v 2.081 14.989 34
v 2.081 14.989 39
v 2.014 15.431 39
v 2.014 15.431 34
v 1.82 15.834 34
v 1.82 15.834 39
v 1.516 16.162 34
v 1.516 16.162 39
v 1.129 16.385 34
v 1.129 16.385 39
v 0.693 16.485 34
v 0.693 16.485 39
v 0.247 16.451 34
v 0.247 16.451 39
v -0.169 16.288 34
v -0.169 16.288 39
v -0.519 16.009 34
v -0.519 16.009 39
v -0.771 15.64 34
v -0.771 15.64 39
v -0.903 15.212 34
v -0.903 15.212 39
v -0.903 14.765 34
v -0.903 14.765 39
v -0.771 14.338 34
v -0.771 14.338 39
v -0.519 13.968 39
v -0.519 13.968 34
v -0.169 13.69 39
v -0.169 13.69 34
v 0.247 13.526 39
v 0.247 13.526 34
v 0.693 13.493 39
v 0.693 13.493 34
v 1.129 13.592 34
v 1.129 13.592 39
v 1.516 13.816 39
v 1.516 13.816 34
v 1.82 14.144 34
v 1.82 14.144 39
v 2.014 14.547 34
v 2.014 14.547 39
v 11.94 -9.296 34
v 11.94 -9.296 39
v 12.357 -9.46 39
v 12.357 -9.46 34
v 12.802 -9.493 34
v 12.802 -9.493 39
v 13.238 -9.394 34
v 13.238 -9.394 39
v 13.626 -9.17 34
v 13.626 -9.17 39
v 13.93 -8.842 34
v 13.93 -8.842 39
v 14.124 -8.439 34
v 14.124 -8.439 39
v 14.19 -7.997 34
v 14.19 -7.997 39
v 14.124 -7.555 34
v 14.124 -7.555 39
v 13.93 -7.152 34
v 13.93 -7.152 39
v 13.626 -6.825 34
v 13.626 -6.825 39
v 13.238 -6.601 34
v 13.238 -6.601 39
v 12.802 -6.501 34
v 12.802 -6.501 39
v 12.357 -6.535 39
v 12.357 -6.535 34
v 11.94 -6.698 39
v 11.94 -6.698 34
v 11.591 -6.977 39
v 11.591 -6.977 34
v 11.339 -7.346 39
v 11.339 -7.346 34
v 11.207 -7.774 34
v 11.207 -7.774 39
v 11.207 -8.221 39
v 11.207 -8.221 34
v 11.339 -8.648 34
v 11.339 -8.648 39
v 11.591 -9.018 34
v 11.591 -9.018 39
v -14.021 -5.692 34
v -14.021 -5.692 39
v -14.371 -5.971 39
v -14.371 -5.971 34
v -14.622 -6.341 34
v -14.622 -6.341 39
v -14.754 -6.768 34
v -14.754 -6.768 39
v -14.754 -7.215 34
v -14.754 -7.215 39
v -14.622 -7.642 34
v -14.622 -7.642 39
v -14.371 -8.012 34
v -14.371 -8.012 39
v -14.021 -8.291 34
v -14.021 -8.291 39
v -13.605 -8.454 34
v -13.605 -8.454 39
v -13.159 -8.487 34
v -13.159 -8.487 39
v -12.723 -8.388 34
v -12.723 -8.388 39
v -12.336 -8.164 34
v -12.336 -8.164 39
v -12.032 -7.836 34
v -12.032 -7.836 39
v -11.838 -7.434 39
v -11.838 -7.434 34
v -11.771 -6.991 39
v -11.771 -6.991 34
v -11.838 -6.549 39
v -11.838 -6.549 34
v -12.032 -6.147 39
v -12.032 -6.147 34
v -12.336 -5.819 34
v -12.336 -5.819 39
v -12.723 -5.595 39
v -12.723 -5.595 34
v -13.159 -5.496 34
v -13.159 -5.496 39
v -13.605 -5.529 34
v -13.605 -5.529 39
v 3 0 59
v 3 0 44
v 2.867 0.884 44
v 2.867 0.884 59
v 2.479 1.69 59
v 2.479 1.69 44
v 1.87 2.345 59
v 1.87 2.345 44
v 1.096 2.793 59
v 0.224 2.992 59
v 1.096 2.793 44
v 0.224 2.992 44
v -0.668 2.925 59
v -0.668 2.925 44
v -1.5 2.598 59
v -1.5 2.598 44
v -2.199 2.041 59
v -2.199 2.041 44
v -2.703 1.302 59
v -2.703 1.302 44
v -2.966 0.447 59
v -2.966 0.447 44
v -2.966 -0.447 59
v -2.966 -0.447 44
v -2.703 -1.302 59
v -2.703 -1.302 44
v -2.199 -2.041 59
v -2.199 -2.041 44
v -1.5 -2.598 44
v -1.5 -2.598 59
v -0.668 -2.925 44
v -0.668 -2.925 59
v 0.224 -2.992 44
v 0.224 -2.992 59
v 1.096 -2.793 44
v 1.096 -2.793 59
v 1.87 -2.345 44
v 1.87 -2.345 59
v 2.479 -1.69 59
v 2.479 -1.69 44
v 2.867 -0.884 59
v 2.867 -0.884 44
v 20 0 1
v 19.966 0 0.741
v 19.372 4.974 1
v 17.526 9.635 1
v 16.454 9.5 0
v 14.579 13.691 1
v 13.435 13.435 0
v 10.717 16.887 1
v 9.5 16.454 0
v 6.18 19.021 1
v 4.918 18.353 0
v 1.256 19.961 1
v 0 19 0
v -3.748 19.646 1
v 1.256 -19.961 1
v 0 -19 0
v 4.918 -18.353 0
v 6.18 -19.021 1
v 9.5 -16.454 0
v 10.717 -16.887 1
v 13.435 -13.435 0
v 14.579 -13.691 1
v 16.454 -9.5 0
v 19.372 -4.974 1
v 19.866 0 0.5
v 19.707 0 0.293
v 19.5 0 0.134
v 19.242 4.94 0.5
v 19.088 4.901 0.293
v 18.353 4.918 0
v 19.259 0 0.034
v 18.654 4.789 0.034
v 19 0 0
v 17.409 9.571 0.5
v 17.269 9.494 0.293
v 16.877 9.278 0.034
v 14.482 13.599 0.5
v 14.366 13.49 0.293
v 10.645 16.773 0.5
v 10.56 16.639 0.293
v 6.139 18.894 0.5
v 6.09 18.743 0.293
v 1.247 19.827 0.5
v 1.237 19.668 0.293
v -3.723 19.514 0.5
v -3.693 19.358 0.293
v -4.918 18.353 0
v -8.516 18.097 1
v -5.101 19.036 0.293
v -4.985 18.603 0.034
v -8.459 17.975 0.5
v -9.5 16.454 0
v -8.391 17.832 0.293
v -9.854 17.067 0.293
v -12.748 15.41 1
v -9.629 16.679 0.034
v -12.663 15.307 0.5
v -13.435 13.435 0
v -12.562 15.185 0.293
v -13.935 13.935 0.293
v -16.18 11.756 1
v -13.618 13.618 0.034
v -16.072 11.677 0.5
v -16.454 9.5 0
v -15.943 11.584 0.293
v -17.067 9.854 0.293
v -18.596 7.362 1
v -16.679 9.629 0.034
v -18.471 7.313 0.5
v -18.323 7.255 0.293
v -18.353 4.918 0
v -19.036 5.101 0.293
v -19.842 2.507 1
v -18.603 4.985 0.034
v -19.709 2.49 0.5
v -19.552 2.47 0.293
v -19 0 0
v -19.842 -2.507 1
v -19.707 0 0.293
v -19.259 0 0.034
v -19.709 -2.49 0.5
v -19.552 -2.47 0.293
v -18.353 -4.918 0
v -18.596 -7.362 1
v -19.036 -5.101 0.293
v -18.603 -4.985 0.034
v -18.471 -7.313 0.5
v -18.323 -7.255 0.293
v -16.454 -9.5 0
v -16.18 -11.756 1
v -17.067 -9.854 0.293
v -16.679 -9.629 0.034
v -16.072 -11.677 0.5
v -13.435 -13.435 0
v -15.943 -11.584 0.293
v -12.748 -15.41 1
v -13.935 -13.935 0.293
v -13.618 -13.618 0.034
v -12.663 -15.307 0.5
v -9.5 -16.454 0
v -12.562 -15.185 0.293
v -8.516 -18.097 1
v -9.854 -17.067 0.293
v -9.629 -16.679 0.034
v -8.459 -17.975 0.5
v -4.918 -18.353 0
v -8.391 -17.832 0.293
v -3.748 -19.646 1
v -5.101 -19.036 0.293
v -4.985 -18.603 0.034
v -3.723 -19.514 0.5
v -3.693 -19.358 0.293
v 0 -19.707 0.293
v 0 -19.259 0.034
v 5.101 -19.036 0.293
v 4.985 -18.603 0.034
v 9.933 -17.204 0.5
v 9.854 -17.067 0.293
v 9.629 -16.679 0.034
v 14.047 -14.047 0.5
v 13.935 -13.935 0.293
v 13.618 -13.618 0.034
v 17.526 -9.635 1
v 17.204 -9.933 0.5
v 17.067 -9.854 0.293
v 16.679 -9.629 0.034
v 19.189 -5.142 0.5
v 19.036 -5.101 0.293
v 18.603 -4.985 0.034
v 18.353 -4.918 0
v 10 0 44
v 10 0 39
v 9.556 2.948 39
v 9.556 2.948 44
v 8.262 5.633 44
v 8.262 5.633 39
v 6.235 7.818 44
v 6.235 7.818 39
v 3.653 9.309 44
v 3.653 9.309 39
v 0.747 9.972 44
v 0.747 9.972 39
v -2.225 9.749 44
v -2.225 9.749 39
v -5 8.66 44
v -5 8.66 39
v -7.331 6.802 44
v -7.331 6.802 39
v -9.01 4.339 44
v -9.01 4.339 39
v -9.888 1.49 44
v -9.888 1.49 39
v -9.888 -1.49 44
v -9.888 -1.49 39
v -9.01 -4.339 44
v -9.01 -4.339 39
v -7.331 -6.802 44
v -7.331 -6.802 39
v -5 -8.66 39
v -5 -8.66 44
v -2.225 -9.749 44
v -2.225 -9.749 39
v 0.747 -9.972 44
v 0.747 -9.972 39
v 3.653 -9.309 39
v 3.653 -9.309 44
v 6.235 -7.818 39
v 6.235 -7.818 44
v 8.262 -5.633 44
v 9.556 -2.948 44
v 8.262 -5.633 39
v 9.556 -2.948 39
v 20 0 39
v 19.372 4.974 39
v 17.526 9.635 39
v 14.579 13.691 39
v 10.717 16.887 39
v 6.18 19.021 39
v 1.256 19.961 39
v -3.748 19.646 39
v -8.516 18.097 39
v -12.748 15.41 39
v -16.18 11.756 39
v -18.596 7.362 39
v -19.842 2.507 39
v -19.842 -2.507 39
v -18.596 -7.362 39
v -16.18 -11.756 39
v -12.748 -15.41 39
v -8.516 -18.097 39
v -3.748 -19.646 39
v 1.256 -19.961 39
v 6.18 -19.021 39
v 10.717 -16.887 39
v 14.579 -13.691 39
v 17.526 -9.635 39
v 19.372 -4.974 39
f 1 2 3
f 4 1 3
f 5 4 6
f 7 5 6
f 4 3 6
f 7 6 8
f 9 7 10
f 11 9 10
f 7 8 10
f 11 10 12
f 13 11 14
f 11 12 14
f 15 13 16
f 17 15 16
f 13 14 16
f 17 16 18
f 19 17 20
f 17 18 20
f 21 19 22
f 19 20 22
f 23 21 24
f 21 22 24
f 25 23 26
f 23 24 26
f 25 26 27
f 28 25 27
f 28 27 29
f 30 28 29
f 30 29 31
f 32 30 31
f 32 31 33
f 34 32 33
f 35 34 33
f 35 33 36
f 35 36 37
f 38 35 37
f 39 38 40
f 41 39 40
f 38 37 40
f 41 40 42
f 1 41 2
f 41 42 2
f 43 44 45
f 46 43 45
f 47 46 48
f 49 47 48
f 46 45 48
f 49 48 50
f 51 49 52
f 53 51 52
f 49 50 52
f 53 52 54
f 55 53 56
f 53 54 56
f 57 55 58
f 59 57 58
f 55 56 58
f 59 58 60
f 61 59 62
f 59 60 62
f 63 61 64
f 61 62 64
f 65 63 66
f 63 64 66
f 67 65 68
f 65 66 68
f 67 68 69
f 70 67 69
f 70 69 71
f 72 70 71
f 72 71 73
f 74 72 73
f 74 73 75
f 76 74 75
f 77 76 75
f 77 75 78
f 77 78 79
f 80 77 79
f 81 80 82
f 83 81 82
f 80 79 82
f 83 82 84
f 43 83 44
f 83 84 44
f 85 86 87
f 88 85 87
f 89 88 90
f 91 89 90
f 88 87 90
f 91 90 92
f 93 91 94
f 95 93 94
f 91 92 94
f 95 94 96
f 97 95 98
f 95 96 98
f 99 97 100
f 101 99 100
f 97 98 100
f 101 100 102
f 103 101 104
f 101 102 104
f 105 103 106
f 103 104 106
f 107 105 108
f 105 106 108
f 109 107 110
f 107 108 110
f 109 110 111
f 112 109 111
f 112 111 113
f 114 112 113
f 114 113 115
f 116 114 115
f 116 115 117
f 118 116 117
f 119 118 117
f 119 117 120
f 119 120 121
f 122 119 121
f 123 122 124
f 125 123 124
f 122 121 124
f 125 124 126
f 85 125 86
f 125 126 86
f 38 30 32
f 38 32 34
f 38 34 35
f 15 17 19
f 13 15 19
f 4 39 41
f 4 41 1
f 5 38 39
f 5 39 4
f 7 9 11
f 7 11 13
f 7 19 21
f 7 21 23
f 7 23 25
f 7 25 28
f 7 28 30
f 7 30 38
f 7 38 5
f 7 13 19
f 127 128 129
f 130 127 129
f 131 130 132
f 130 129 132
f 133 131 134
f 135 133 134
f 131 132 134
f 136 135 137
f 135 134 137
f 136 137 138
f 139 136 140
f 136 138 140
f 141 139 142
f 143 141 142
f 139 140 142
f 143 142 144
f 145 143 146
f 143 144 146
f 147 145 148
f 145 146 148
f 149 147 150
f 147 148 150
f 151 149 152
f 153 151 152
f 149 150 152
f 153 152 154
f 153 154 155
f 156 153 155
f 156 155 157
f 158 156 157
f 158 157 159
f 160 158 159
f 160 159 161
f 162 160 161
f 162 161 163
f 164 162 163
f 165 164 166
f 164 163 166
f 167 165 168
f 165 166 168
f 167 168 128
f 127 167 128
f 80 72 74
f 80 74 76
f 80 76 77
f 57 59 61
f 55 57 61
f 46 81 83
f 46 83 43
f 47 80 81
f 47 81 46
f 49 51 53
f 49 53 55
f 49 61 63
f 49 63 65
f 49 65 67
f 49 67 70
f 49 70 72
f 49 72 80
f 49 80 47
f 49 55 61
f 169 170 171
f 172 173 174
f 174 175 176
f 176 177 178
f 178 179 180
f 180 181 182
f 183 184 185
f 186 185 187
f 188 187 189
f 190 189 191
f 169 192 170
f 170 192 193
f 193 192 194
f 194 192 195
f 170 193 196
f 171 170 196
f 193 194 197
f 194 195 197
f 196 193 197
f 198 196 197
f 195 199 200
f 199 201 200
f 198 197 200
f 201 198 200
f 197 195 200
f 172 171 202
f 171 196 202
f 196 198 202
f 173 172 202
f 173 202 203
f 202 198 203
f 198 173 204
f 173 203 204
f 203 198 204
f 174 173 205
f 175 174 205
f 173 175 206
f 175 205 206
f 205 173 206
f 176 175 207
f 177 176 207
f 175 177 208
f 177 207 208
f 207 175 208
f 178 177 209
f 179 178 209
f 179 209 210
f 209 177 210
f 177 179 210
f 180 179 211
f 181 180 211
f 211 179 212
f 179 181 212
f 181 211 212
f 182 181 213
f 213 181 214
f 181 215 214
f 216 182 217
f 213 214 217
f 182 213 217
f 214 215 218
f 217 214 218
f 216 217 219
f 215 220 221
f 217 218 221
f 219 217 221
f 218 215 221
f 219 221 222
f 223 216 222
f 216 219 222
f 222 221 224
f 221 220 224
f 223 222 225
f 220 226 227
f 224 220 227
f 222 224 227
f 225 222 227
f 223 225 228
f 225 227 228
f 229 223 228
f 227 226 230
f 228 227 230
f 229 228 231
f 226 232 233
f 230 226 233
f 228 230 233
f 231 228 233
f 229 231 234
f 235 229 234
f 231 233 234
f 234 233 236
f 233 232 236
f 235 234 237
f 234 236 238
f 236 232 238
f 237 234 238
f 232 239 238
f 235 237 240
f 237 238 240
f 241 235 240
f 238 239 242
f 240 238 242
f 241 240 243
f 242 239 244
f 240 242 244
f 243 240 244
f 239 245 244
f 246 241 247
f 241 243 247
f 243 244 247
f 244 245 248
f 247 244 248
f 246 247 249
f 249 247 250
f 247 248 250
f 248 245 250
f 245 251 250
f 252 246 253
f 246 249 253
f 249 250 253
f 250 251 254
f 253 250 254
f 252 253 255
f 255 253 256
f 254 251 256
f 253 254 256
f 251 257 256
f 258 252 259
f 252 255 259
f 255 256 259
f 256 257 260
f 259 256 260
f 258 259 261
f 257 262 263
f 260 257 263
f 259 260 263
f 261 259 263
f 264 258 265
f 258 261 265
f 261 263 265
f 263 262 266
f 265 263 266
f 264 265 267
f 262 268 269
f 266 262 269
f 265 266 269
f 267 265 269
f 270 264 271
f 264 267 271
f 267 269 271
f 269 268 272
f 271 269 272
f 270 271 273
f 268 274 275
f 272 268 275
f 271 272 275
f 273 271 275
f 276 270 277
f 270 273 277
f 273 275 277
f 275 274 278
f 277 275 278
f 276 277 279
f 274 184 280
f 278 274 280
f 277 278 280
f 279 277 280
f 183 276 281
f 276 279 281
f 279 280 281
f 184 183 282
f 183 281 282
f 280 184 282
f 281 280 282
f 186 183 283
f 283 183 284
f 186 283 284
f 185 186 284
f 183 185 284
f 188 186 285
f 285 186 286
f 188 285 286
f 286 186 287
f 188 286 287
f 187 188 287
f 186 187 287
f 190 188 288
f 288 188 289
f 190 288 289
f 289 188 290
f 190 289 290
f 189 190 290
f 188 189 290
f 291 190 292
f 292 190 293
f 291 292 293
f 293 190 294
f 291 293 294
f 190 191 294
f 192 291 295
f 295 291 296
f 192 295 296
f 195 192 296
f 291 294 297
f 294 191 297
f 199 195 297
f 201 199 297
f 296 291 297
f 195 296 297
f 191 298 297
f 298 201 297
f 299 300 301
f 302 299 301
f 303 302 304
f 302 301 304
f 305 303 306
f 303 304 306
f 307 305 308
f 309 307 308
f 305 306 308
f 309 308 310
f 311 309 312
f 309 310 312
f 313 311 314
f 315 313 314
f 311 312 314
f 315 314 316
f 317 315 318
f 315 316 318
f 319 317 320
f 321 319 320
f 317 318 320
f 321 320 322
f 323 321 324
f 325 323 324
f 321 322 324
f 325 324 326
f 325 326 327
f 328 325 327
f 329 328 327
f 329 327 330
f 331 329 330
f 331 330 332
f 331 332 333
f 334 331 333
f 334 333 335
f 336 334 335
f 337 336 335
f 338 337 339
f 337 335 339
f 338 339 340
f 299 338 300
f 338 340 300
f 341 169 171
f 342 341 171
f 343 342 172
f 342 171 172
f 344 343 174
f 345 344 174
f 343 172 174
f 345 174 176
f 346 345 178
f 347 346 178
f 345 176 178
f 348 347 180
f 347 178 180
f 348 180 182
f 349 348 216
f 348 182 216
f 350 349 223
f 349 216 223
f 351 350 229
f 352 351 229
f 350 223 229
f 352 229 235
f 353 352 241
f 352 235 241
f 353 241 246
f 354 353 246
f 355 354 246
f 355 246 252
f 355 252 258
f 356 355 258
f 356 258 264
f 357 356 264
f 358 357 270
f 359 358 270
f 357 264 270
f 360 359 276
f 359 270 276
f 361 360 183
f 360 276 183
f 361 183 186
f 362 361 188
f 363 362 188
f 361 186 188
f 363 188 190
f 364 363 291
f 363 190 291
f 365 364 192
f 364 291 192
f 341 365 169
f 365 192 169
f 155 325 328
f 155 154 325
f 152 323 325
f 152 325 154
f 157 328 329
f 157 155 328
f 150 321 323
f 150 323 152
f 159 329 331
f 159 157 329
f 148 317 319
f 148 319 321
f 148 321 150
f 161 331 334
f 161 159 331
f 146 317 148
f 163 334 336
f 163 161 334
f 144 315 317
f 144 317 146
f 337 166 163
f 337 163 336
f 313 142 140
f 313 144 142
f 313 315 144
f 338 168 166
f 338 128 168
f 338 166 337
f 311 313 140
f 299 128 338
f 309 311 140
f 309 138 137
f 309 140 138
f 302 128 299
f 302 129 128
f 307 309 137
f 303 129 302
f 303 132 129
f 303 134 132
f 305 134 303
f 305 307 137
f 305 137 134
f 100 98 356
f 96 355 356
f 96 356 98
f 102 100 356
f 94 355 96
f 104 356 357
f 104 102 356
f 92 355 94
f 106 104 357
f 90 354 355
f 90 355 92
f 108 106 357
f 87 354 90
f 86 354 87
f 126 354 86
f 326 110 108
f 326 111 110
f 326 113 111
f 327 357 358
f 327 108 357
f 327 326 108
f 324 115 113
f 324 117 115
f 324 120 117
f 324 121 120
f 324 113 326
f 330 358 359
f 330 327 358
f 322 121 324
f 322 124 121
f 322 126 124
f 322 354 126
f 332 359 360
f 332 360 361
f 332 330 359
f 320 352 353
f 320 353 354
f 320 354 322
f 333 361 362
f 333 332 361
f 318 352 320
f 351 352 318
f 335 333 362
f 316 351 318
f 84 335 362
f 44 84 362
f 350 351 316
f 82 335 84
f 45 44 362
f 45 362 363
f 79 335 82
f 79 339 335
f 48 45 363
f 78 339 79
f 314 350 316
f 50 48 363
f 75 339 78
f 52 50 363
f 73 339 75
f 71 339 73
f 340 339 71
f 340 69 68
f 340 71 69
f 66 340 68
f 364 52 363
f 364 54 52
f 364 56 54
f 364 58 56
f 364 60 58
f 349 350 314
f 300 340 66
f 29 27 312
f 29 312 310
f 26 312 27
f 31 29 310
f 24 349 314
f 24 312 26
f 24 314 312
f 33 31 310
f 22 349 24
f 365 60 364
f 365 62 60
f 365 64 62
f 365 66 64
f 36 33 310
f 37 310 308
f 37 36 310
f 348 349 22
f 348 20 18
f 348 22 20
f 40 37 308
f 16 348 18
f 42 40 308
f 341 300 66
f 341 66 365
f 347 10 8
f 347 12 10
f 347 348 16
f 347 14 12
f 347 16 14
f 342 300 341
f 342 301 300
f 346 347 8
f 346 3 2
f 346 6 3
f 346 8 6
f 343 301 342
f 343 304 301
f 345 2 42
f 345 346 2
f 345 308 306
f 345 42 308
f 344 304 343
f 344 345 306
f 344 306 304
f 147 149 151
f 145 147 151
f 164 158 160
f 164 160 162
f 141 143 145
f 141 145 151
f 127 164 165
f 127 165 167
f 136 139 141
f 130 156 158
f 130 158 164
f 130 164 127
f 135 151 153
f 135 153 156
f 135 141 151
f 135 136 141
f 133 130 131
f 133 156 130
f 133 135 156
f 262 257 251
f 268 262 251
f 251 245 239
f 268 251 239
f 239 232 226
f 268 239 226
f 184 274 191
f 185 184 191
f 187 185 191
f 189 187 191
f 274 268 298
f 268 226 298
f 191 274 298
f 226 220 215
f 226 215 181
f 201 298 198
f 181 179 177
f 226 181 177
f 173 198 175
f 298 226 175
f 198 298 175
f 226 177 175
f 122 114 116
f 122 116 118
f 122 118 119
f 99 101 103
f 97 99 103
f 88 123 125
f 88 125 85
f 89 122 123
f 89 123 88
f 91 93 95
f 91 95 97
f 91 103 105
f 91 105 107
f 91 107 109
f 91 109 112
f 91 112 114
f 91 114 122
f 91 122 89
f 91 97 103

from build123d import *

# Parameters (mm, degrees)
SKETCH1_R           = 20
BOSS_EXTRUDE1_DEPTH = 39
SKETCH2_R           = 10
BOSS_EXTRUDE2_DEPTH = 5
SKETCH3_R           = 3
BOSS_EXTRUDE3_DEPTH = 15
FILLET1_R           = 1
SKETCH4_R           = 1.5
CUT_EXTRUDE1_DEPTH  = 5
CIRPATTERN1_COUNT   = 3


with BuildPart() as part:
    # Sketch1 → Boss-Extrude1 (new body)
    with BuildSketch(Plane.XY):
        Circle(SKETCH1_R)
    extrude(amount=BOSS_EXTRUDE1_DEPTH)

    # Sketch2 → Boss-Extrude2 (add)
    with BuildSketch(Plane.XY.offset(39)):
        Circle(SKETCH2_R)
    extrude(amount=BOSS_EXTRUDE2_DEPTH)

    # Sketch3 → Boss-Extrude3 (add)
    with BuildSketch(Plane.XY.offset(44)):
        Circle(SKETCH3_R)
    extrude(amount=BOSS_EXTRUDE3_DEPTH)

    # Fillet1
    fillet1_edges = [part.edges().sort_by_distance(p)[0] for p in [
        (-20, 0, 0),
    ]]
    fillet(fillet1_edges, radius=FILLET1_R)

    # Sketch4 → Cut-Extrude1 (cut)
    with BuildSketch(Plane.XY.offset(39)):
        with Locations((0.580678207, 14.988756213)):
            Circle(SKETCH4_R)
    cut_extrude1 = extrude(amount=-CUT_EXTRUDE1_DEPTH, mode=Mode.SUBTRACT)

    # CirPattern1: Cut-Extrude1 ×3 about axis
    cirpattern1_axis = Axis((0, 0, 0), (0, 0, 1))
    for i in range(1, CIRPATTERN1_COUNT):
        add(cut_extrude1.rotate(cirpattern1_axis, i * 360 / CIRPATTERN1_COUNT), mode=Mode.SUBTRACT)


solid = part.part
